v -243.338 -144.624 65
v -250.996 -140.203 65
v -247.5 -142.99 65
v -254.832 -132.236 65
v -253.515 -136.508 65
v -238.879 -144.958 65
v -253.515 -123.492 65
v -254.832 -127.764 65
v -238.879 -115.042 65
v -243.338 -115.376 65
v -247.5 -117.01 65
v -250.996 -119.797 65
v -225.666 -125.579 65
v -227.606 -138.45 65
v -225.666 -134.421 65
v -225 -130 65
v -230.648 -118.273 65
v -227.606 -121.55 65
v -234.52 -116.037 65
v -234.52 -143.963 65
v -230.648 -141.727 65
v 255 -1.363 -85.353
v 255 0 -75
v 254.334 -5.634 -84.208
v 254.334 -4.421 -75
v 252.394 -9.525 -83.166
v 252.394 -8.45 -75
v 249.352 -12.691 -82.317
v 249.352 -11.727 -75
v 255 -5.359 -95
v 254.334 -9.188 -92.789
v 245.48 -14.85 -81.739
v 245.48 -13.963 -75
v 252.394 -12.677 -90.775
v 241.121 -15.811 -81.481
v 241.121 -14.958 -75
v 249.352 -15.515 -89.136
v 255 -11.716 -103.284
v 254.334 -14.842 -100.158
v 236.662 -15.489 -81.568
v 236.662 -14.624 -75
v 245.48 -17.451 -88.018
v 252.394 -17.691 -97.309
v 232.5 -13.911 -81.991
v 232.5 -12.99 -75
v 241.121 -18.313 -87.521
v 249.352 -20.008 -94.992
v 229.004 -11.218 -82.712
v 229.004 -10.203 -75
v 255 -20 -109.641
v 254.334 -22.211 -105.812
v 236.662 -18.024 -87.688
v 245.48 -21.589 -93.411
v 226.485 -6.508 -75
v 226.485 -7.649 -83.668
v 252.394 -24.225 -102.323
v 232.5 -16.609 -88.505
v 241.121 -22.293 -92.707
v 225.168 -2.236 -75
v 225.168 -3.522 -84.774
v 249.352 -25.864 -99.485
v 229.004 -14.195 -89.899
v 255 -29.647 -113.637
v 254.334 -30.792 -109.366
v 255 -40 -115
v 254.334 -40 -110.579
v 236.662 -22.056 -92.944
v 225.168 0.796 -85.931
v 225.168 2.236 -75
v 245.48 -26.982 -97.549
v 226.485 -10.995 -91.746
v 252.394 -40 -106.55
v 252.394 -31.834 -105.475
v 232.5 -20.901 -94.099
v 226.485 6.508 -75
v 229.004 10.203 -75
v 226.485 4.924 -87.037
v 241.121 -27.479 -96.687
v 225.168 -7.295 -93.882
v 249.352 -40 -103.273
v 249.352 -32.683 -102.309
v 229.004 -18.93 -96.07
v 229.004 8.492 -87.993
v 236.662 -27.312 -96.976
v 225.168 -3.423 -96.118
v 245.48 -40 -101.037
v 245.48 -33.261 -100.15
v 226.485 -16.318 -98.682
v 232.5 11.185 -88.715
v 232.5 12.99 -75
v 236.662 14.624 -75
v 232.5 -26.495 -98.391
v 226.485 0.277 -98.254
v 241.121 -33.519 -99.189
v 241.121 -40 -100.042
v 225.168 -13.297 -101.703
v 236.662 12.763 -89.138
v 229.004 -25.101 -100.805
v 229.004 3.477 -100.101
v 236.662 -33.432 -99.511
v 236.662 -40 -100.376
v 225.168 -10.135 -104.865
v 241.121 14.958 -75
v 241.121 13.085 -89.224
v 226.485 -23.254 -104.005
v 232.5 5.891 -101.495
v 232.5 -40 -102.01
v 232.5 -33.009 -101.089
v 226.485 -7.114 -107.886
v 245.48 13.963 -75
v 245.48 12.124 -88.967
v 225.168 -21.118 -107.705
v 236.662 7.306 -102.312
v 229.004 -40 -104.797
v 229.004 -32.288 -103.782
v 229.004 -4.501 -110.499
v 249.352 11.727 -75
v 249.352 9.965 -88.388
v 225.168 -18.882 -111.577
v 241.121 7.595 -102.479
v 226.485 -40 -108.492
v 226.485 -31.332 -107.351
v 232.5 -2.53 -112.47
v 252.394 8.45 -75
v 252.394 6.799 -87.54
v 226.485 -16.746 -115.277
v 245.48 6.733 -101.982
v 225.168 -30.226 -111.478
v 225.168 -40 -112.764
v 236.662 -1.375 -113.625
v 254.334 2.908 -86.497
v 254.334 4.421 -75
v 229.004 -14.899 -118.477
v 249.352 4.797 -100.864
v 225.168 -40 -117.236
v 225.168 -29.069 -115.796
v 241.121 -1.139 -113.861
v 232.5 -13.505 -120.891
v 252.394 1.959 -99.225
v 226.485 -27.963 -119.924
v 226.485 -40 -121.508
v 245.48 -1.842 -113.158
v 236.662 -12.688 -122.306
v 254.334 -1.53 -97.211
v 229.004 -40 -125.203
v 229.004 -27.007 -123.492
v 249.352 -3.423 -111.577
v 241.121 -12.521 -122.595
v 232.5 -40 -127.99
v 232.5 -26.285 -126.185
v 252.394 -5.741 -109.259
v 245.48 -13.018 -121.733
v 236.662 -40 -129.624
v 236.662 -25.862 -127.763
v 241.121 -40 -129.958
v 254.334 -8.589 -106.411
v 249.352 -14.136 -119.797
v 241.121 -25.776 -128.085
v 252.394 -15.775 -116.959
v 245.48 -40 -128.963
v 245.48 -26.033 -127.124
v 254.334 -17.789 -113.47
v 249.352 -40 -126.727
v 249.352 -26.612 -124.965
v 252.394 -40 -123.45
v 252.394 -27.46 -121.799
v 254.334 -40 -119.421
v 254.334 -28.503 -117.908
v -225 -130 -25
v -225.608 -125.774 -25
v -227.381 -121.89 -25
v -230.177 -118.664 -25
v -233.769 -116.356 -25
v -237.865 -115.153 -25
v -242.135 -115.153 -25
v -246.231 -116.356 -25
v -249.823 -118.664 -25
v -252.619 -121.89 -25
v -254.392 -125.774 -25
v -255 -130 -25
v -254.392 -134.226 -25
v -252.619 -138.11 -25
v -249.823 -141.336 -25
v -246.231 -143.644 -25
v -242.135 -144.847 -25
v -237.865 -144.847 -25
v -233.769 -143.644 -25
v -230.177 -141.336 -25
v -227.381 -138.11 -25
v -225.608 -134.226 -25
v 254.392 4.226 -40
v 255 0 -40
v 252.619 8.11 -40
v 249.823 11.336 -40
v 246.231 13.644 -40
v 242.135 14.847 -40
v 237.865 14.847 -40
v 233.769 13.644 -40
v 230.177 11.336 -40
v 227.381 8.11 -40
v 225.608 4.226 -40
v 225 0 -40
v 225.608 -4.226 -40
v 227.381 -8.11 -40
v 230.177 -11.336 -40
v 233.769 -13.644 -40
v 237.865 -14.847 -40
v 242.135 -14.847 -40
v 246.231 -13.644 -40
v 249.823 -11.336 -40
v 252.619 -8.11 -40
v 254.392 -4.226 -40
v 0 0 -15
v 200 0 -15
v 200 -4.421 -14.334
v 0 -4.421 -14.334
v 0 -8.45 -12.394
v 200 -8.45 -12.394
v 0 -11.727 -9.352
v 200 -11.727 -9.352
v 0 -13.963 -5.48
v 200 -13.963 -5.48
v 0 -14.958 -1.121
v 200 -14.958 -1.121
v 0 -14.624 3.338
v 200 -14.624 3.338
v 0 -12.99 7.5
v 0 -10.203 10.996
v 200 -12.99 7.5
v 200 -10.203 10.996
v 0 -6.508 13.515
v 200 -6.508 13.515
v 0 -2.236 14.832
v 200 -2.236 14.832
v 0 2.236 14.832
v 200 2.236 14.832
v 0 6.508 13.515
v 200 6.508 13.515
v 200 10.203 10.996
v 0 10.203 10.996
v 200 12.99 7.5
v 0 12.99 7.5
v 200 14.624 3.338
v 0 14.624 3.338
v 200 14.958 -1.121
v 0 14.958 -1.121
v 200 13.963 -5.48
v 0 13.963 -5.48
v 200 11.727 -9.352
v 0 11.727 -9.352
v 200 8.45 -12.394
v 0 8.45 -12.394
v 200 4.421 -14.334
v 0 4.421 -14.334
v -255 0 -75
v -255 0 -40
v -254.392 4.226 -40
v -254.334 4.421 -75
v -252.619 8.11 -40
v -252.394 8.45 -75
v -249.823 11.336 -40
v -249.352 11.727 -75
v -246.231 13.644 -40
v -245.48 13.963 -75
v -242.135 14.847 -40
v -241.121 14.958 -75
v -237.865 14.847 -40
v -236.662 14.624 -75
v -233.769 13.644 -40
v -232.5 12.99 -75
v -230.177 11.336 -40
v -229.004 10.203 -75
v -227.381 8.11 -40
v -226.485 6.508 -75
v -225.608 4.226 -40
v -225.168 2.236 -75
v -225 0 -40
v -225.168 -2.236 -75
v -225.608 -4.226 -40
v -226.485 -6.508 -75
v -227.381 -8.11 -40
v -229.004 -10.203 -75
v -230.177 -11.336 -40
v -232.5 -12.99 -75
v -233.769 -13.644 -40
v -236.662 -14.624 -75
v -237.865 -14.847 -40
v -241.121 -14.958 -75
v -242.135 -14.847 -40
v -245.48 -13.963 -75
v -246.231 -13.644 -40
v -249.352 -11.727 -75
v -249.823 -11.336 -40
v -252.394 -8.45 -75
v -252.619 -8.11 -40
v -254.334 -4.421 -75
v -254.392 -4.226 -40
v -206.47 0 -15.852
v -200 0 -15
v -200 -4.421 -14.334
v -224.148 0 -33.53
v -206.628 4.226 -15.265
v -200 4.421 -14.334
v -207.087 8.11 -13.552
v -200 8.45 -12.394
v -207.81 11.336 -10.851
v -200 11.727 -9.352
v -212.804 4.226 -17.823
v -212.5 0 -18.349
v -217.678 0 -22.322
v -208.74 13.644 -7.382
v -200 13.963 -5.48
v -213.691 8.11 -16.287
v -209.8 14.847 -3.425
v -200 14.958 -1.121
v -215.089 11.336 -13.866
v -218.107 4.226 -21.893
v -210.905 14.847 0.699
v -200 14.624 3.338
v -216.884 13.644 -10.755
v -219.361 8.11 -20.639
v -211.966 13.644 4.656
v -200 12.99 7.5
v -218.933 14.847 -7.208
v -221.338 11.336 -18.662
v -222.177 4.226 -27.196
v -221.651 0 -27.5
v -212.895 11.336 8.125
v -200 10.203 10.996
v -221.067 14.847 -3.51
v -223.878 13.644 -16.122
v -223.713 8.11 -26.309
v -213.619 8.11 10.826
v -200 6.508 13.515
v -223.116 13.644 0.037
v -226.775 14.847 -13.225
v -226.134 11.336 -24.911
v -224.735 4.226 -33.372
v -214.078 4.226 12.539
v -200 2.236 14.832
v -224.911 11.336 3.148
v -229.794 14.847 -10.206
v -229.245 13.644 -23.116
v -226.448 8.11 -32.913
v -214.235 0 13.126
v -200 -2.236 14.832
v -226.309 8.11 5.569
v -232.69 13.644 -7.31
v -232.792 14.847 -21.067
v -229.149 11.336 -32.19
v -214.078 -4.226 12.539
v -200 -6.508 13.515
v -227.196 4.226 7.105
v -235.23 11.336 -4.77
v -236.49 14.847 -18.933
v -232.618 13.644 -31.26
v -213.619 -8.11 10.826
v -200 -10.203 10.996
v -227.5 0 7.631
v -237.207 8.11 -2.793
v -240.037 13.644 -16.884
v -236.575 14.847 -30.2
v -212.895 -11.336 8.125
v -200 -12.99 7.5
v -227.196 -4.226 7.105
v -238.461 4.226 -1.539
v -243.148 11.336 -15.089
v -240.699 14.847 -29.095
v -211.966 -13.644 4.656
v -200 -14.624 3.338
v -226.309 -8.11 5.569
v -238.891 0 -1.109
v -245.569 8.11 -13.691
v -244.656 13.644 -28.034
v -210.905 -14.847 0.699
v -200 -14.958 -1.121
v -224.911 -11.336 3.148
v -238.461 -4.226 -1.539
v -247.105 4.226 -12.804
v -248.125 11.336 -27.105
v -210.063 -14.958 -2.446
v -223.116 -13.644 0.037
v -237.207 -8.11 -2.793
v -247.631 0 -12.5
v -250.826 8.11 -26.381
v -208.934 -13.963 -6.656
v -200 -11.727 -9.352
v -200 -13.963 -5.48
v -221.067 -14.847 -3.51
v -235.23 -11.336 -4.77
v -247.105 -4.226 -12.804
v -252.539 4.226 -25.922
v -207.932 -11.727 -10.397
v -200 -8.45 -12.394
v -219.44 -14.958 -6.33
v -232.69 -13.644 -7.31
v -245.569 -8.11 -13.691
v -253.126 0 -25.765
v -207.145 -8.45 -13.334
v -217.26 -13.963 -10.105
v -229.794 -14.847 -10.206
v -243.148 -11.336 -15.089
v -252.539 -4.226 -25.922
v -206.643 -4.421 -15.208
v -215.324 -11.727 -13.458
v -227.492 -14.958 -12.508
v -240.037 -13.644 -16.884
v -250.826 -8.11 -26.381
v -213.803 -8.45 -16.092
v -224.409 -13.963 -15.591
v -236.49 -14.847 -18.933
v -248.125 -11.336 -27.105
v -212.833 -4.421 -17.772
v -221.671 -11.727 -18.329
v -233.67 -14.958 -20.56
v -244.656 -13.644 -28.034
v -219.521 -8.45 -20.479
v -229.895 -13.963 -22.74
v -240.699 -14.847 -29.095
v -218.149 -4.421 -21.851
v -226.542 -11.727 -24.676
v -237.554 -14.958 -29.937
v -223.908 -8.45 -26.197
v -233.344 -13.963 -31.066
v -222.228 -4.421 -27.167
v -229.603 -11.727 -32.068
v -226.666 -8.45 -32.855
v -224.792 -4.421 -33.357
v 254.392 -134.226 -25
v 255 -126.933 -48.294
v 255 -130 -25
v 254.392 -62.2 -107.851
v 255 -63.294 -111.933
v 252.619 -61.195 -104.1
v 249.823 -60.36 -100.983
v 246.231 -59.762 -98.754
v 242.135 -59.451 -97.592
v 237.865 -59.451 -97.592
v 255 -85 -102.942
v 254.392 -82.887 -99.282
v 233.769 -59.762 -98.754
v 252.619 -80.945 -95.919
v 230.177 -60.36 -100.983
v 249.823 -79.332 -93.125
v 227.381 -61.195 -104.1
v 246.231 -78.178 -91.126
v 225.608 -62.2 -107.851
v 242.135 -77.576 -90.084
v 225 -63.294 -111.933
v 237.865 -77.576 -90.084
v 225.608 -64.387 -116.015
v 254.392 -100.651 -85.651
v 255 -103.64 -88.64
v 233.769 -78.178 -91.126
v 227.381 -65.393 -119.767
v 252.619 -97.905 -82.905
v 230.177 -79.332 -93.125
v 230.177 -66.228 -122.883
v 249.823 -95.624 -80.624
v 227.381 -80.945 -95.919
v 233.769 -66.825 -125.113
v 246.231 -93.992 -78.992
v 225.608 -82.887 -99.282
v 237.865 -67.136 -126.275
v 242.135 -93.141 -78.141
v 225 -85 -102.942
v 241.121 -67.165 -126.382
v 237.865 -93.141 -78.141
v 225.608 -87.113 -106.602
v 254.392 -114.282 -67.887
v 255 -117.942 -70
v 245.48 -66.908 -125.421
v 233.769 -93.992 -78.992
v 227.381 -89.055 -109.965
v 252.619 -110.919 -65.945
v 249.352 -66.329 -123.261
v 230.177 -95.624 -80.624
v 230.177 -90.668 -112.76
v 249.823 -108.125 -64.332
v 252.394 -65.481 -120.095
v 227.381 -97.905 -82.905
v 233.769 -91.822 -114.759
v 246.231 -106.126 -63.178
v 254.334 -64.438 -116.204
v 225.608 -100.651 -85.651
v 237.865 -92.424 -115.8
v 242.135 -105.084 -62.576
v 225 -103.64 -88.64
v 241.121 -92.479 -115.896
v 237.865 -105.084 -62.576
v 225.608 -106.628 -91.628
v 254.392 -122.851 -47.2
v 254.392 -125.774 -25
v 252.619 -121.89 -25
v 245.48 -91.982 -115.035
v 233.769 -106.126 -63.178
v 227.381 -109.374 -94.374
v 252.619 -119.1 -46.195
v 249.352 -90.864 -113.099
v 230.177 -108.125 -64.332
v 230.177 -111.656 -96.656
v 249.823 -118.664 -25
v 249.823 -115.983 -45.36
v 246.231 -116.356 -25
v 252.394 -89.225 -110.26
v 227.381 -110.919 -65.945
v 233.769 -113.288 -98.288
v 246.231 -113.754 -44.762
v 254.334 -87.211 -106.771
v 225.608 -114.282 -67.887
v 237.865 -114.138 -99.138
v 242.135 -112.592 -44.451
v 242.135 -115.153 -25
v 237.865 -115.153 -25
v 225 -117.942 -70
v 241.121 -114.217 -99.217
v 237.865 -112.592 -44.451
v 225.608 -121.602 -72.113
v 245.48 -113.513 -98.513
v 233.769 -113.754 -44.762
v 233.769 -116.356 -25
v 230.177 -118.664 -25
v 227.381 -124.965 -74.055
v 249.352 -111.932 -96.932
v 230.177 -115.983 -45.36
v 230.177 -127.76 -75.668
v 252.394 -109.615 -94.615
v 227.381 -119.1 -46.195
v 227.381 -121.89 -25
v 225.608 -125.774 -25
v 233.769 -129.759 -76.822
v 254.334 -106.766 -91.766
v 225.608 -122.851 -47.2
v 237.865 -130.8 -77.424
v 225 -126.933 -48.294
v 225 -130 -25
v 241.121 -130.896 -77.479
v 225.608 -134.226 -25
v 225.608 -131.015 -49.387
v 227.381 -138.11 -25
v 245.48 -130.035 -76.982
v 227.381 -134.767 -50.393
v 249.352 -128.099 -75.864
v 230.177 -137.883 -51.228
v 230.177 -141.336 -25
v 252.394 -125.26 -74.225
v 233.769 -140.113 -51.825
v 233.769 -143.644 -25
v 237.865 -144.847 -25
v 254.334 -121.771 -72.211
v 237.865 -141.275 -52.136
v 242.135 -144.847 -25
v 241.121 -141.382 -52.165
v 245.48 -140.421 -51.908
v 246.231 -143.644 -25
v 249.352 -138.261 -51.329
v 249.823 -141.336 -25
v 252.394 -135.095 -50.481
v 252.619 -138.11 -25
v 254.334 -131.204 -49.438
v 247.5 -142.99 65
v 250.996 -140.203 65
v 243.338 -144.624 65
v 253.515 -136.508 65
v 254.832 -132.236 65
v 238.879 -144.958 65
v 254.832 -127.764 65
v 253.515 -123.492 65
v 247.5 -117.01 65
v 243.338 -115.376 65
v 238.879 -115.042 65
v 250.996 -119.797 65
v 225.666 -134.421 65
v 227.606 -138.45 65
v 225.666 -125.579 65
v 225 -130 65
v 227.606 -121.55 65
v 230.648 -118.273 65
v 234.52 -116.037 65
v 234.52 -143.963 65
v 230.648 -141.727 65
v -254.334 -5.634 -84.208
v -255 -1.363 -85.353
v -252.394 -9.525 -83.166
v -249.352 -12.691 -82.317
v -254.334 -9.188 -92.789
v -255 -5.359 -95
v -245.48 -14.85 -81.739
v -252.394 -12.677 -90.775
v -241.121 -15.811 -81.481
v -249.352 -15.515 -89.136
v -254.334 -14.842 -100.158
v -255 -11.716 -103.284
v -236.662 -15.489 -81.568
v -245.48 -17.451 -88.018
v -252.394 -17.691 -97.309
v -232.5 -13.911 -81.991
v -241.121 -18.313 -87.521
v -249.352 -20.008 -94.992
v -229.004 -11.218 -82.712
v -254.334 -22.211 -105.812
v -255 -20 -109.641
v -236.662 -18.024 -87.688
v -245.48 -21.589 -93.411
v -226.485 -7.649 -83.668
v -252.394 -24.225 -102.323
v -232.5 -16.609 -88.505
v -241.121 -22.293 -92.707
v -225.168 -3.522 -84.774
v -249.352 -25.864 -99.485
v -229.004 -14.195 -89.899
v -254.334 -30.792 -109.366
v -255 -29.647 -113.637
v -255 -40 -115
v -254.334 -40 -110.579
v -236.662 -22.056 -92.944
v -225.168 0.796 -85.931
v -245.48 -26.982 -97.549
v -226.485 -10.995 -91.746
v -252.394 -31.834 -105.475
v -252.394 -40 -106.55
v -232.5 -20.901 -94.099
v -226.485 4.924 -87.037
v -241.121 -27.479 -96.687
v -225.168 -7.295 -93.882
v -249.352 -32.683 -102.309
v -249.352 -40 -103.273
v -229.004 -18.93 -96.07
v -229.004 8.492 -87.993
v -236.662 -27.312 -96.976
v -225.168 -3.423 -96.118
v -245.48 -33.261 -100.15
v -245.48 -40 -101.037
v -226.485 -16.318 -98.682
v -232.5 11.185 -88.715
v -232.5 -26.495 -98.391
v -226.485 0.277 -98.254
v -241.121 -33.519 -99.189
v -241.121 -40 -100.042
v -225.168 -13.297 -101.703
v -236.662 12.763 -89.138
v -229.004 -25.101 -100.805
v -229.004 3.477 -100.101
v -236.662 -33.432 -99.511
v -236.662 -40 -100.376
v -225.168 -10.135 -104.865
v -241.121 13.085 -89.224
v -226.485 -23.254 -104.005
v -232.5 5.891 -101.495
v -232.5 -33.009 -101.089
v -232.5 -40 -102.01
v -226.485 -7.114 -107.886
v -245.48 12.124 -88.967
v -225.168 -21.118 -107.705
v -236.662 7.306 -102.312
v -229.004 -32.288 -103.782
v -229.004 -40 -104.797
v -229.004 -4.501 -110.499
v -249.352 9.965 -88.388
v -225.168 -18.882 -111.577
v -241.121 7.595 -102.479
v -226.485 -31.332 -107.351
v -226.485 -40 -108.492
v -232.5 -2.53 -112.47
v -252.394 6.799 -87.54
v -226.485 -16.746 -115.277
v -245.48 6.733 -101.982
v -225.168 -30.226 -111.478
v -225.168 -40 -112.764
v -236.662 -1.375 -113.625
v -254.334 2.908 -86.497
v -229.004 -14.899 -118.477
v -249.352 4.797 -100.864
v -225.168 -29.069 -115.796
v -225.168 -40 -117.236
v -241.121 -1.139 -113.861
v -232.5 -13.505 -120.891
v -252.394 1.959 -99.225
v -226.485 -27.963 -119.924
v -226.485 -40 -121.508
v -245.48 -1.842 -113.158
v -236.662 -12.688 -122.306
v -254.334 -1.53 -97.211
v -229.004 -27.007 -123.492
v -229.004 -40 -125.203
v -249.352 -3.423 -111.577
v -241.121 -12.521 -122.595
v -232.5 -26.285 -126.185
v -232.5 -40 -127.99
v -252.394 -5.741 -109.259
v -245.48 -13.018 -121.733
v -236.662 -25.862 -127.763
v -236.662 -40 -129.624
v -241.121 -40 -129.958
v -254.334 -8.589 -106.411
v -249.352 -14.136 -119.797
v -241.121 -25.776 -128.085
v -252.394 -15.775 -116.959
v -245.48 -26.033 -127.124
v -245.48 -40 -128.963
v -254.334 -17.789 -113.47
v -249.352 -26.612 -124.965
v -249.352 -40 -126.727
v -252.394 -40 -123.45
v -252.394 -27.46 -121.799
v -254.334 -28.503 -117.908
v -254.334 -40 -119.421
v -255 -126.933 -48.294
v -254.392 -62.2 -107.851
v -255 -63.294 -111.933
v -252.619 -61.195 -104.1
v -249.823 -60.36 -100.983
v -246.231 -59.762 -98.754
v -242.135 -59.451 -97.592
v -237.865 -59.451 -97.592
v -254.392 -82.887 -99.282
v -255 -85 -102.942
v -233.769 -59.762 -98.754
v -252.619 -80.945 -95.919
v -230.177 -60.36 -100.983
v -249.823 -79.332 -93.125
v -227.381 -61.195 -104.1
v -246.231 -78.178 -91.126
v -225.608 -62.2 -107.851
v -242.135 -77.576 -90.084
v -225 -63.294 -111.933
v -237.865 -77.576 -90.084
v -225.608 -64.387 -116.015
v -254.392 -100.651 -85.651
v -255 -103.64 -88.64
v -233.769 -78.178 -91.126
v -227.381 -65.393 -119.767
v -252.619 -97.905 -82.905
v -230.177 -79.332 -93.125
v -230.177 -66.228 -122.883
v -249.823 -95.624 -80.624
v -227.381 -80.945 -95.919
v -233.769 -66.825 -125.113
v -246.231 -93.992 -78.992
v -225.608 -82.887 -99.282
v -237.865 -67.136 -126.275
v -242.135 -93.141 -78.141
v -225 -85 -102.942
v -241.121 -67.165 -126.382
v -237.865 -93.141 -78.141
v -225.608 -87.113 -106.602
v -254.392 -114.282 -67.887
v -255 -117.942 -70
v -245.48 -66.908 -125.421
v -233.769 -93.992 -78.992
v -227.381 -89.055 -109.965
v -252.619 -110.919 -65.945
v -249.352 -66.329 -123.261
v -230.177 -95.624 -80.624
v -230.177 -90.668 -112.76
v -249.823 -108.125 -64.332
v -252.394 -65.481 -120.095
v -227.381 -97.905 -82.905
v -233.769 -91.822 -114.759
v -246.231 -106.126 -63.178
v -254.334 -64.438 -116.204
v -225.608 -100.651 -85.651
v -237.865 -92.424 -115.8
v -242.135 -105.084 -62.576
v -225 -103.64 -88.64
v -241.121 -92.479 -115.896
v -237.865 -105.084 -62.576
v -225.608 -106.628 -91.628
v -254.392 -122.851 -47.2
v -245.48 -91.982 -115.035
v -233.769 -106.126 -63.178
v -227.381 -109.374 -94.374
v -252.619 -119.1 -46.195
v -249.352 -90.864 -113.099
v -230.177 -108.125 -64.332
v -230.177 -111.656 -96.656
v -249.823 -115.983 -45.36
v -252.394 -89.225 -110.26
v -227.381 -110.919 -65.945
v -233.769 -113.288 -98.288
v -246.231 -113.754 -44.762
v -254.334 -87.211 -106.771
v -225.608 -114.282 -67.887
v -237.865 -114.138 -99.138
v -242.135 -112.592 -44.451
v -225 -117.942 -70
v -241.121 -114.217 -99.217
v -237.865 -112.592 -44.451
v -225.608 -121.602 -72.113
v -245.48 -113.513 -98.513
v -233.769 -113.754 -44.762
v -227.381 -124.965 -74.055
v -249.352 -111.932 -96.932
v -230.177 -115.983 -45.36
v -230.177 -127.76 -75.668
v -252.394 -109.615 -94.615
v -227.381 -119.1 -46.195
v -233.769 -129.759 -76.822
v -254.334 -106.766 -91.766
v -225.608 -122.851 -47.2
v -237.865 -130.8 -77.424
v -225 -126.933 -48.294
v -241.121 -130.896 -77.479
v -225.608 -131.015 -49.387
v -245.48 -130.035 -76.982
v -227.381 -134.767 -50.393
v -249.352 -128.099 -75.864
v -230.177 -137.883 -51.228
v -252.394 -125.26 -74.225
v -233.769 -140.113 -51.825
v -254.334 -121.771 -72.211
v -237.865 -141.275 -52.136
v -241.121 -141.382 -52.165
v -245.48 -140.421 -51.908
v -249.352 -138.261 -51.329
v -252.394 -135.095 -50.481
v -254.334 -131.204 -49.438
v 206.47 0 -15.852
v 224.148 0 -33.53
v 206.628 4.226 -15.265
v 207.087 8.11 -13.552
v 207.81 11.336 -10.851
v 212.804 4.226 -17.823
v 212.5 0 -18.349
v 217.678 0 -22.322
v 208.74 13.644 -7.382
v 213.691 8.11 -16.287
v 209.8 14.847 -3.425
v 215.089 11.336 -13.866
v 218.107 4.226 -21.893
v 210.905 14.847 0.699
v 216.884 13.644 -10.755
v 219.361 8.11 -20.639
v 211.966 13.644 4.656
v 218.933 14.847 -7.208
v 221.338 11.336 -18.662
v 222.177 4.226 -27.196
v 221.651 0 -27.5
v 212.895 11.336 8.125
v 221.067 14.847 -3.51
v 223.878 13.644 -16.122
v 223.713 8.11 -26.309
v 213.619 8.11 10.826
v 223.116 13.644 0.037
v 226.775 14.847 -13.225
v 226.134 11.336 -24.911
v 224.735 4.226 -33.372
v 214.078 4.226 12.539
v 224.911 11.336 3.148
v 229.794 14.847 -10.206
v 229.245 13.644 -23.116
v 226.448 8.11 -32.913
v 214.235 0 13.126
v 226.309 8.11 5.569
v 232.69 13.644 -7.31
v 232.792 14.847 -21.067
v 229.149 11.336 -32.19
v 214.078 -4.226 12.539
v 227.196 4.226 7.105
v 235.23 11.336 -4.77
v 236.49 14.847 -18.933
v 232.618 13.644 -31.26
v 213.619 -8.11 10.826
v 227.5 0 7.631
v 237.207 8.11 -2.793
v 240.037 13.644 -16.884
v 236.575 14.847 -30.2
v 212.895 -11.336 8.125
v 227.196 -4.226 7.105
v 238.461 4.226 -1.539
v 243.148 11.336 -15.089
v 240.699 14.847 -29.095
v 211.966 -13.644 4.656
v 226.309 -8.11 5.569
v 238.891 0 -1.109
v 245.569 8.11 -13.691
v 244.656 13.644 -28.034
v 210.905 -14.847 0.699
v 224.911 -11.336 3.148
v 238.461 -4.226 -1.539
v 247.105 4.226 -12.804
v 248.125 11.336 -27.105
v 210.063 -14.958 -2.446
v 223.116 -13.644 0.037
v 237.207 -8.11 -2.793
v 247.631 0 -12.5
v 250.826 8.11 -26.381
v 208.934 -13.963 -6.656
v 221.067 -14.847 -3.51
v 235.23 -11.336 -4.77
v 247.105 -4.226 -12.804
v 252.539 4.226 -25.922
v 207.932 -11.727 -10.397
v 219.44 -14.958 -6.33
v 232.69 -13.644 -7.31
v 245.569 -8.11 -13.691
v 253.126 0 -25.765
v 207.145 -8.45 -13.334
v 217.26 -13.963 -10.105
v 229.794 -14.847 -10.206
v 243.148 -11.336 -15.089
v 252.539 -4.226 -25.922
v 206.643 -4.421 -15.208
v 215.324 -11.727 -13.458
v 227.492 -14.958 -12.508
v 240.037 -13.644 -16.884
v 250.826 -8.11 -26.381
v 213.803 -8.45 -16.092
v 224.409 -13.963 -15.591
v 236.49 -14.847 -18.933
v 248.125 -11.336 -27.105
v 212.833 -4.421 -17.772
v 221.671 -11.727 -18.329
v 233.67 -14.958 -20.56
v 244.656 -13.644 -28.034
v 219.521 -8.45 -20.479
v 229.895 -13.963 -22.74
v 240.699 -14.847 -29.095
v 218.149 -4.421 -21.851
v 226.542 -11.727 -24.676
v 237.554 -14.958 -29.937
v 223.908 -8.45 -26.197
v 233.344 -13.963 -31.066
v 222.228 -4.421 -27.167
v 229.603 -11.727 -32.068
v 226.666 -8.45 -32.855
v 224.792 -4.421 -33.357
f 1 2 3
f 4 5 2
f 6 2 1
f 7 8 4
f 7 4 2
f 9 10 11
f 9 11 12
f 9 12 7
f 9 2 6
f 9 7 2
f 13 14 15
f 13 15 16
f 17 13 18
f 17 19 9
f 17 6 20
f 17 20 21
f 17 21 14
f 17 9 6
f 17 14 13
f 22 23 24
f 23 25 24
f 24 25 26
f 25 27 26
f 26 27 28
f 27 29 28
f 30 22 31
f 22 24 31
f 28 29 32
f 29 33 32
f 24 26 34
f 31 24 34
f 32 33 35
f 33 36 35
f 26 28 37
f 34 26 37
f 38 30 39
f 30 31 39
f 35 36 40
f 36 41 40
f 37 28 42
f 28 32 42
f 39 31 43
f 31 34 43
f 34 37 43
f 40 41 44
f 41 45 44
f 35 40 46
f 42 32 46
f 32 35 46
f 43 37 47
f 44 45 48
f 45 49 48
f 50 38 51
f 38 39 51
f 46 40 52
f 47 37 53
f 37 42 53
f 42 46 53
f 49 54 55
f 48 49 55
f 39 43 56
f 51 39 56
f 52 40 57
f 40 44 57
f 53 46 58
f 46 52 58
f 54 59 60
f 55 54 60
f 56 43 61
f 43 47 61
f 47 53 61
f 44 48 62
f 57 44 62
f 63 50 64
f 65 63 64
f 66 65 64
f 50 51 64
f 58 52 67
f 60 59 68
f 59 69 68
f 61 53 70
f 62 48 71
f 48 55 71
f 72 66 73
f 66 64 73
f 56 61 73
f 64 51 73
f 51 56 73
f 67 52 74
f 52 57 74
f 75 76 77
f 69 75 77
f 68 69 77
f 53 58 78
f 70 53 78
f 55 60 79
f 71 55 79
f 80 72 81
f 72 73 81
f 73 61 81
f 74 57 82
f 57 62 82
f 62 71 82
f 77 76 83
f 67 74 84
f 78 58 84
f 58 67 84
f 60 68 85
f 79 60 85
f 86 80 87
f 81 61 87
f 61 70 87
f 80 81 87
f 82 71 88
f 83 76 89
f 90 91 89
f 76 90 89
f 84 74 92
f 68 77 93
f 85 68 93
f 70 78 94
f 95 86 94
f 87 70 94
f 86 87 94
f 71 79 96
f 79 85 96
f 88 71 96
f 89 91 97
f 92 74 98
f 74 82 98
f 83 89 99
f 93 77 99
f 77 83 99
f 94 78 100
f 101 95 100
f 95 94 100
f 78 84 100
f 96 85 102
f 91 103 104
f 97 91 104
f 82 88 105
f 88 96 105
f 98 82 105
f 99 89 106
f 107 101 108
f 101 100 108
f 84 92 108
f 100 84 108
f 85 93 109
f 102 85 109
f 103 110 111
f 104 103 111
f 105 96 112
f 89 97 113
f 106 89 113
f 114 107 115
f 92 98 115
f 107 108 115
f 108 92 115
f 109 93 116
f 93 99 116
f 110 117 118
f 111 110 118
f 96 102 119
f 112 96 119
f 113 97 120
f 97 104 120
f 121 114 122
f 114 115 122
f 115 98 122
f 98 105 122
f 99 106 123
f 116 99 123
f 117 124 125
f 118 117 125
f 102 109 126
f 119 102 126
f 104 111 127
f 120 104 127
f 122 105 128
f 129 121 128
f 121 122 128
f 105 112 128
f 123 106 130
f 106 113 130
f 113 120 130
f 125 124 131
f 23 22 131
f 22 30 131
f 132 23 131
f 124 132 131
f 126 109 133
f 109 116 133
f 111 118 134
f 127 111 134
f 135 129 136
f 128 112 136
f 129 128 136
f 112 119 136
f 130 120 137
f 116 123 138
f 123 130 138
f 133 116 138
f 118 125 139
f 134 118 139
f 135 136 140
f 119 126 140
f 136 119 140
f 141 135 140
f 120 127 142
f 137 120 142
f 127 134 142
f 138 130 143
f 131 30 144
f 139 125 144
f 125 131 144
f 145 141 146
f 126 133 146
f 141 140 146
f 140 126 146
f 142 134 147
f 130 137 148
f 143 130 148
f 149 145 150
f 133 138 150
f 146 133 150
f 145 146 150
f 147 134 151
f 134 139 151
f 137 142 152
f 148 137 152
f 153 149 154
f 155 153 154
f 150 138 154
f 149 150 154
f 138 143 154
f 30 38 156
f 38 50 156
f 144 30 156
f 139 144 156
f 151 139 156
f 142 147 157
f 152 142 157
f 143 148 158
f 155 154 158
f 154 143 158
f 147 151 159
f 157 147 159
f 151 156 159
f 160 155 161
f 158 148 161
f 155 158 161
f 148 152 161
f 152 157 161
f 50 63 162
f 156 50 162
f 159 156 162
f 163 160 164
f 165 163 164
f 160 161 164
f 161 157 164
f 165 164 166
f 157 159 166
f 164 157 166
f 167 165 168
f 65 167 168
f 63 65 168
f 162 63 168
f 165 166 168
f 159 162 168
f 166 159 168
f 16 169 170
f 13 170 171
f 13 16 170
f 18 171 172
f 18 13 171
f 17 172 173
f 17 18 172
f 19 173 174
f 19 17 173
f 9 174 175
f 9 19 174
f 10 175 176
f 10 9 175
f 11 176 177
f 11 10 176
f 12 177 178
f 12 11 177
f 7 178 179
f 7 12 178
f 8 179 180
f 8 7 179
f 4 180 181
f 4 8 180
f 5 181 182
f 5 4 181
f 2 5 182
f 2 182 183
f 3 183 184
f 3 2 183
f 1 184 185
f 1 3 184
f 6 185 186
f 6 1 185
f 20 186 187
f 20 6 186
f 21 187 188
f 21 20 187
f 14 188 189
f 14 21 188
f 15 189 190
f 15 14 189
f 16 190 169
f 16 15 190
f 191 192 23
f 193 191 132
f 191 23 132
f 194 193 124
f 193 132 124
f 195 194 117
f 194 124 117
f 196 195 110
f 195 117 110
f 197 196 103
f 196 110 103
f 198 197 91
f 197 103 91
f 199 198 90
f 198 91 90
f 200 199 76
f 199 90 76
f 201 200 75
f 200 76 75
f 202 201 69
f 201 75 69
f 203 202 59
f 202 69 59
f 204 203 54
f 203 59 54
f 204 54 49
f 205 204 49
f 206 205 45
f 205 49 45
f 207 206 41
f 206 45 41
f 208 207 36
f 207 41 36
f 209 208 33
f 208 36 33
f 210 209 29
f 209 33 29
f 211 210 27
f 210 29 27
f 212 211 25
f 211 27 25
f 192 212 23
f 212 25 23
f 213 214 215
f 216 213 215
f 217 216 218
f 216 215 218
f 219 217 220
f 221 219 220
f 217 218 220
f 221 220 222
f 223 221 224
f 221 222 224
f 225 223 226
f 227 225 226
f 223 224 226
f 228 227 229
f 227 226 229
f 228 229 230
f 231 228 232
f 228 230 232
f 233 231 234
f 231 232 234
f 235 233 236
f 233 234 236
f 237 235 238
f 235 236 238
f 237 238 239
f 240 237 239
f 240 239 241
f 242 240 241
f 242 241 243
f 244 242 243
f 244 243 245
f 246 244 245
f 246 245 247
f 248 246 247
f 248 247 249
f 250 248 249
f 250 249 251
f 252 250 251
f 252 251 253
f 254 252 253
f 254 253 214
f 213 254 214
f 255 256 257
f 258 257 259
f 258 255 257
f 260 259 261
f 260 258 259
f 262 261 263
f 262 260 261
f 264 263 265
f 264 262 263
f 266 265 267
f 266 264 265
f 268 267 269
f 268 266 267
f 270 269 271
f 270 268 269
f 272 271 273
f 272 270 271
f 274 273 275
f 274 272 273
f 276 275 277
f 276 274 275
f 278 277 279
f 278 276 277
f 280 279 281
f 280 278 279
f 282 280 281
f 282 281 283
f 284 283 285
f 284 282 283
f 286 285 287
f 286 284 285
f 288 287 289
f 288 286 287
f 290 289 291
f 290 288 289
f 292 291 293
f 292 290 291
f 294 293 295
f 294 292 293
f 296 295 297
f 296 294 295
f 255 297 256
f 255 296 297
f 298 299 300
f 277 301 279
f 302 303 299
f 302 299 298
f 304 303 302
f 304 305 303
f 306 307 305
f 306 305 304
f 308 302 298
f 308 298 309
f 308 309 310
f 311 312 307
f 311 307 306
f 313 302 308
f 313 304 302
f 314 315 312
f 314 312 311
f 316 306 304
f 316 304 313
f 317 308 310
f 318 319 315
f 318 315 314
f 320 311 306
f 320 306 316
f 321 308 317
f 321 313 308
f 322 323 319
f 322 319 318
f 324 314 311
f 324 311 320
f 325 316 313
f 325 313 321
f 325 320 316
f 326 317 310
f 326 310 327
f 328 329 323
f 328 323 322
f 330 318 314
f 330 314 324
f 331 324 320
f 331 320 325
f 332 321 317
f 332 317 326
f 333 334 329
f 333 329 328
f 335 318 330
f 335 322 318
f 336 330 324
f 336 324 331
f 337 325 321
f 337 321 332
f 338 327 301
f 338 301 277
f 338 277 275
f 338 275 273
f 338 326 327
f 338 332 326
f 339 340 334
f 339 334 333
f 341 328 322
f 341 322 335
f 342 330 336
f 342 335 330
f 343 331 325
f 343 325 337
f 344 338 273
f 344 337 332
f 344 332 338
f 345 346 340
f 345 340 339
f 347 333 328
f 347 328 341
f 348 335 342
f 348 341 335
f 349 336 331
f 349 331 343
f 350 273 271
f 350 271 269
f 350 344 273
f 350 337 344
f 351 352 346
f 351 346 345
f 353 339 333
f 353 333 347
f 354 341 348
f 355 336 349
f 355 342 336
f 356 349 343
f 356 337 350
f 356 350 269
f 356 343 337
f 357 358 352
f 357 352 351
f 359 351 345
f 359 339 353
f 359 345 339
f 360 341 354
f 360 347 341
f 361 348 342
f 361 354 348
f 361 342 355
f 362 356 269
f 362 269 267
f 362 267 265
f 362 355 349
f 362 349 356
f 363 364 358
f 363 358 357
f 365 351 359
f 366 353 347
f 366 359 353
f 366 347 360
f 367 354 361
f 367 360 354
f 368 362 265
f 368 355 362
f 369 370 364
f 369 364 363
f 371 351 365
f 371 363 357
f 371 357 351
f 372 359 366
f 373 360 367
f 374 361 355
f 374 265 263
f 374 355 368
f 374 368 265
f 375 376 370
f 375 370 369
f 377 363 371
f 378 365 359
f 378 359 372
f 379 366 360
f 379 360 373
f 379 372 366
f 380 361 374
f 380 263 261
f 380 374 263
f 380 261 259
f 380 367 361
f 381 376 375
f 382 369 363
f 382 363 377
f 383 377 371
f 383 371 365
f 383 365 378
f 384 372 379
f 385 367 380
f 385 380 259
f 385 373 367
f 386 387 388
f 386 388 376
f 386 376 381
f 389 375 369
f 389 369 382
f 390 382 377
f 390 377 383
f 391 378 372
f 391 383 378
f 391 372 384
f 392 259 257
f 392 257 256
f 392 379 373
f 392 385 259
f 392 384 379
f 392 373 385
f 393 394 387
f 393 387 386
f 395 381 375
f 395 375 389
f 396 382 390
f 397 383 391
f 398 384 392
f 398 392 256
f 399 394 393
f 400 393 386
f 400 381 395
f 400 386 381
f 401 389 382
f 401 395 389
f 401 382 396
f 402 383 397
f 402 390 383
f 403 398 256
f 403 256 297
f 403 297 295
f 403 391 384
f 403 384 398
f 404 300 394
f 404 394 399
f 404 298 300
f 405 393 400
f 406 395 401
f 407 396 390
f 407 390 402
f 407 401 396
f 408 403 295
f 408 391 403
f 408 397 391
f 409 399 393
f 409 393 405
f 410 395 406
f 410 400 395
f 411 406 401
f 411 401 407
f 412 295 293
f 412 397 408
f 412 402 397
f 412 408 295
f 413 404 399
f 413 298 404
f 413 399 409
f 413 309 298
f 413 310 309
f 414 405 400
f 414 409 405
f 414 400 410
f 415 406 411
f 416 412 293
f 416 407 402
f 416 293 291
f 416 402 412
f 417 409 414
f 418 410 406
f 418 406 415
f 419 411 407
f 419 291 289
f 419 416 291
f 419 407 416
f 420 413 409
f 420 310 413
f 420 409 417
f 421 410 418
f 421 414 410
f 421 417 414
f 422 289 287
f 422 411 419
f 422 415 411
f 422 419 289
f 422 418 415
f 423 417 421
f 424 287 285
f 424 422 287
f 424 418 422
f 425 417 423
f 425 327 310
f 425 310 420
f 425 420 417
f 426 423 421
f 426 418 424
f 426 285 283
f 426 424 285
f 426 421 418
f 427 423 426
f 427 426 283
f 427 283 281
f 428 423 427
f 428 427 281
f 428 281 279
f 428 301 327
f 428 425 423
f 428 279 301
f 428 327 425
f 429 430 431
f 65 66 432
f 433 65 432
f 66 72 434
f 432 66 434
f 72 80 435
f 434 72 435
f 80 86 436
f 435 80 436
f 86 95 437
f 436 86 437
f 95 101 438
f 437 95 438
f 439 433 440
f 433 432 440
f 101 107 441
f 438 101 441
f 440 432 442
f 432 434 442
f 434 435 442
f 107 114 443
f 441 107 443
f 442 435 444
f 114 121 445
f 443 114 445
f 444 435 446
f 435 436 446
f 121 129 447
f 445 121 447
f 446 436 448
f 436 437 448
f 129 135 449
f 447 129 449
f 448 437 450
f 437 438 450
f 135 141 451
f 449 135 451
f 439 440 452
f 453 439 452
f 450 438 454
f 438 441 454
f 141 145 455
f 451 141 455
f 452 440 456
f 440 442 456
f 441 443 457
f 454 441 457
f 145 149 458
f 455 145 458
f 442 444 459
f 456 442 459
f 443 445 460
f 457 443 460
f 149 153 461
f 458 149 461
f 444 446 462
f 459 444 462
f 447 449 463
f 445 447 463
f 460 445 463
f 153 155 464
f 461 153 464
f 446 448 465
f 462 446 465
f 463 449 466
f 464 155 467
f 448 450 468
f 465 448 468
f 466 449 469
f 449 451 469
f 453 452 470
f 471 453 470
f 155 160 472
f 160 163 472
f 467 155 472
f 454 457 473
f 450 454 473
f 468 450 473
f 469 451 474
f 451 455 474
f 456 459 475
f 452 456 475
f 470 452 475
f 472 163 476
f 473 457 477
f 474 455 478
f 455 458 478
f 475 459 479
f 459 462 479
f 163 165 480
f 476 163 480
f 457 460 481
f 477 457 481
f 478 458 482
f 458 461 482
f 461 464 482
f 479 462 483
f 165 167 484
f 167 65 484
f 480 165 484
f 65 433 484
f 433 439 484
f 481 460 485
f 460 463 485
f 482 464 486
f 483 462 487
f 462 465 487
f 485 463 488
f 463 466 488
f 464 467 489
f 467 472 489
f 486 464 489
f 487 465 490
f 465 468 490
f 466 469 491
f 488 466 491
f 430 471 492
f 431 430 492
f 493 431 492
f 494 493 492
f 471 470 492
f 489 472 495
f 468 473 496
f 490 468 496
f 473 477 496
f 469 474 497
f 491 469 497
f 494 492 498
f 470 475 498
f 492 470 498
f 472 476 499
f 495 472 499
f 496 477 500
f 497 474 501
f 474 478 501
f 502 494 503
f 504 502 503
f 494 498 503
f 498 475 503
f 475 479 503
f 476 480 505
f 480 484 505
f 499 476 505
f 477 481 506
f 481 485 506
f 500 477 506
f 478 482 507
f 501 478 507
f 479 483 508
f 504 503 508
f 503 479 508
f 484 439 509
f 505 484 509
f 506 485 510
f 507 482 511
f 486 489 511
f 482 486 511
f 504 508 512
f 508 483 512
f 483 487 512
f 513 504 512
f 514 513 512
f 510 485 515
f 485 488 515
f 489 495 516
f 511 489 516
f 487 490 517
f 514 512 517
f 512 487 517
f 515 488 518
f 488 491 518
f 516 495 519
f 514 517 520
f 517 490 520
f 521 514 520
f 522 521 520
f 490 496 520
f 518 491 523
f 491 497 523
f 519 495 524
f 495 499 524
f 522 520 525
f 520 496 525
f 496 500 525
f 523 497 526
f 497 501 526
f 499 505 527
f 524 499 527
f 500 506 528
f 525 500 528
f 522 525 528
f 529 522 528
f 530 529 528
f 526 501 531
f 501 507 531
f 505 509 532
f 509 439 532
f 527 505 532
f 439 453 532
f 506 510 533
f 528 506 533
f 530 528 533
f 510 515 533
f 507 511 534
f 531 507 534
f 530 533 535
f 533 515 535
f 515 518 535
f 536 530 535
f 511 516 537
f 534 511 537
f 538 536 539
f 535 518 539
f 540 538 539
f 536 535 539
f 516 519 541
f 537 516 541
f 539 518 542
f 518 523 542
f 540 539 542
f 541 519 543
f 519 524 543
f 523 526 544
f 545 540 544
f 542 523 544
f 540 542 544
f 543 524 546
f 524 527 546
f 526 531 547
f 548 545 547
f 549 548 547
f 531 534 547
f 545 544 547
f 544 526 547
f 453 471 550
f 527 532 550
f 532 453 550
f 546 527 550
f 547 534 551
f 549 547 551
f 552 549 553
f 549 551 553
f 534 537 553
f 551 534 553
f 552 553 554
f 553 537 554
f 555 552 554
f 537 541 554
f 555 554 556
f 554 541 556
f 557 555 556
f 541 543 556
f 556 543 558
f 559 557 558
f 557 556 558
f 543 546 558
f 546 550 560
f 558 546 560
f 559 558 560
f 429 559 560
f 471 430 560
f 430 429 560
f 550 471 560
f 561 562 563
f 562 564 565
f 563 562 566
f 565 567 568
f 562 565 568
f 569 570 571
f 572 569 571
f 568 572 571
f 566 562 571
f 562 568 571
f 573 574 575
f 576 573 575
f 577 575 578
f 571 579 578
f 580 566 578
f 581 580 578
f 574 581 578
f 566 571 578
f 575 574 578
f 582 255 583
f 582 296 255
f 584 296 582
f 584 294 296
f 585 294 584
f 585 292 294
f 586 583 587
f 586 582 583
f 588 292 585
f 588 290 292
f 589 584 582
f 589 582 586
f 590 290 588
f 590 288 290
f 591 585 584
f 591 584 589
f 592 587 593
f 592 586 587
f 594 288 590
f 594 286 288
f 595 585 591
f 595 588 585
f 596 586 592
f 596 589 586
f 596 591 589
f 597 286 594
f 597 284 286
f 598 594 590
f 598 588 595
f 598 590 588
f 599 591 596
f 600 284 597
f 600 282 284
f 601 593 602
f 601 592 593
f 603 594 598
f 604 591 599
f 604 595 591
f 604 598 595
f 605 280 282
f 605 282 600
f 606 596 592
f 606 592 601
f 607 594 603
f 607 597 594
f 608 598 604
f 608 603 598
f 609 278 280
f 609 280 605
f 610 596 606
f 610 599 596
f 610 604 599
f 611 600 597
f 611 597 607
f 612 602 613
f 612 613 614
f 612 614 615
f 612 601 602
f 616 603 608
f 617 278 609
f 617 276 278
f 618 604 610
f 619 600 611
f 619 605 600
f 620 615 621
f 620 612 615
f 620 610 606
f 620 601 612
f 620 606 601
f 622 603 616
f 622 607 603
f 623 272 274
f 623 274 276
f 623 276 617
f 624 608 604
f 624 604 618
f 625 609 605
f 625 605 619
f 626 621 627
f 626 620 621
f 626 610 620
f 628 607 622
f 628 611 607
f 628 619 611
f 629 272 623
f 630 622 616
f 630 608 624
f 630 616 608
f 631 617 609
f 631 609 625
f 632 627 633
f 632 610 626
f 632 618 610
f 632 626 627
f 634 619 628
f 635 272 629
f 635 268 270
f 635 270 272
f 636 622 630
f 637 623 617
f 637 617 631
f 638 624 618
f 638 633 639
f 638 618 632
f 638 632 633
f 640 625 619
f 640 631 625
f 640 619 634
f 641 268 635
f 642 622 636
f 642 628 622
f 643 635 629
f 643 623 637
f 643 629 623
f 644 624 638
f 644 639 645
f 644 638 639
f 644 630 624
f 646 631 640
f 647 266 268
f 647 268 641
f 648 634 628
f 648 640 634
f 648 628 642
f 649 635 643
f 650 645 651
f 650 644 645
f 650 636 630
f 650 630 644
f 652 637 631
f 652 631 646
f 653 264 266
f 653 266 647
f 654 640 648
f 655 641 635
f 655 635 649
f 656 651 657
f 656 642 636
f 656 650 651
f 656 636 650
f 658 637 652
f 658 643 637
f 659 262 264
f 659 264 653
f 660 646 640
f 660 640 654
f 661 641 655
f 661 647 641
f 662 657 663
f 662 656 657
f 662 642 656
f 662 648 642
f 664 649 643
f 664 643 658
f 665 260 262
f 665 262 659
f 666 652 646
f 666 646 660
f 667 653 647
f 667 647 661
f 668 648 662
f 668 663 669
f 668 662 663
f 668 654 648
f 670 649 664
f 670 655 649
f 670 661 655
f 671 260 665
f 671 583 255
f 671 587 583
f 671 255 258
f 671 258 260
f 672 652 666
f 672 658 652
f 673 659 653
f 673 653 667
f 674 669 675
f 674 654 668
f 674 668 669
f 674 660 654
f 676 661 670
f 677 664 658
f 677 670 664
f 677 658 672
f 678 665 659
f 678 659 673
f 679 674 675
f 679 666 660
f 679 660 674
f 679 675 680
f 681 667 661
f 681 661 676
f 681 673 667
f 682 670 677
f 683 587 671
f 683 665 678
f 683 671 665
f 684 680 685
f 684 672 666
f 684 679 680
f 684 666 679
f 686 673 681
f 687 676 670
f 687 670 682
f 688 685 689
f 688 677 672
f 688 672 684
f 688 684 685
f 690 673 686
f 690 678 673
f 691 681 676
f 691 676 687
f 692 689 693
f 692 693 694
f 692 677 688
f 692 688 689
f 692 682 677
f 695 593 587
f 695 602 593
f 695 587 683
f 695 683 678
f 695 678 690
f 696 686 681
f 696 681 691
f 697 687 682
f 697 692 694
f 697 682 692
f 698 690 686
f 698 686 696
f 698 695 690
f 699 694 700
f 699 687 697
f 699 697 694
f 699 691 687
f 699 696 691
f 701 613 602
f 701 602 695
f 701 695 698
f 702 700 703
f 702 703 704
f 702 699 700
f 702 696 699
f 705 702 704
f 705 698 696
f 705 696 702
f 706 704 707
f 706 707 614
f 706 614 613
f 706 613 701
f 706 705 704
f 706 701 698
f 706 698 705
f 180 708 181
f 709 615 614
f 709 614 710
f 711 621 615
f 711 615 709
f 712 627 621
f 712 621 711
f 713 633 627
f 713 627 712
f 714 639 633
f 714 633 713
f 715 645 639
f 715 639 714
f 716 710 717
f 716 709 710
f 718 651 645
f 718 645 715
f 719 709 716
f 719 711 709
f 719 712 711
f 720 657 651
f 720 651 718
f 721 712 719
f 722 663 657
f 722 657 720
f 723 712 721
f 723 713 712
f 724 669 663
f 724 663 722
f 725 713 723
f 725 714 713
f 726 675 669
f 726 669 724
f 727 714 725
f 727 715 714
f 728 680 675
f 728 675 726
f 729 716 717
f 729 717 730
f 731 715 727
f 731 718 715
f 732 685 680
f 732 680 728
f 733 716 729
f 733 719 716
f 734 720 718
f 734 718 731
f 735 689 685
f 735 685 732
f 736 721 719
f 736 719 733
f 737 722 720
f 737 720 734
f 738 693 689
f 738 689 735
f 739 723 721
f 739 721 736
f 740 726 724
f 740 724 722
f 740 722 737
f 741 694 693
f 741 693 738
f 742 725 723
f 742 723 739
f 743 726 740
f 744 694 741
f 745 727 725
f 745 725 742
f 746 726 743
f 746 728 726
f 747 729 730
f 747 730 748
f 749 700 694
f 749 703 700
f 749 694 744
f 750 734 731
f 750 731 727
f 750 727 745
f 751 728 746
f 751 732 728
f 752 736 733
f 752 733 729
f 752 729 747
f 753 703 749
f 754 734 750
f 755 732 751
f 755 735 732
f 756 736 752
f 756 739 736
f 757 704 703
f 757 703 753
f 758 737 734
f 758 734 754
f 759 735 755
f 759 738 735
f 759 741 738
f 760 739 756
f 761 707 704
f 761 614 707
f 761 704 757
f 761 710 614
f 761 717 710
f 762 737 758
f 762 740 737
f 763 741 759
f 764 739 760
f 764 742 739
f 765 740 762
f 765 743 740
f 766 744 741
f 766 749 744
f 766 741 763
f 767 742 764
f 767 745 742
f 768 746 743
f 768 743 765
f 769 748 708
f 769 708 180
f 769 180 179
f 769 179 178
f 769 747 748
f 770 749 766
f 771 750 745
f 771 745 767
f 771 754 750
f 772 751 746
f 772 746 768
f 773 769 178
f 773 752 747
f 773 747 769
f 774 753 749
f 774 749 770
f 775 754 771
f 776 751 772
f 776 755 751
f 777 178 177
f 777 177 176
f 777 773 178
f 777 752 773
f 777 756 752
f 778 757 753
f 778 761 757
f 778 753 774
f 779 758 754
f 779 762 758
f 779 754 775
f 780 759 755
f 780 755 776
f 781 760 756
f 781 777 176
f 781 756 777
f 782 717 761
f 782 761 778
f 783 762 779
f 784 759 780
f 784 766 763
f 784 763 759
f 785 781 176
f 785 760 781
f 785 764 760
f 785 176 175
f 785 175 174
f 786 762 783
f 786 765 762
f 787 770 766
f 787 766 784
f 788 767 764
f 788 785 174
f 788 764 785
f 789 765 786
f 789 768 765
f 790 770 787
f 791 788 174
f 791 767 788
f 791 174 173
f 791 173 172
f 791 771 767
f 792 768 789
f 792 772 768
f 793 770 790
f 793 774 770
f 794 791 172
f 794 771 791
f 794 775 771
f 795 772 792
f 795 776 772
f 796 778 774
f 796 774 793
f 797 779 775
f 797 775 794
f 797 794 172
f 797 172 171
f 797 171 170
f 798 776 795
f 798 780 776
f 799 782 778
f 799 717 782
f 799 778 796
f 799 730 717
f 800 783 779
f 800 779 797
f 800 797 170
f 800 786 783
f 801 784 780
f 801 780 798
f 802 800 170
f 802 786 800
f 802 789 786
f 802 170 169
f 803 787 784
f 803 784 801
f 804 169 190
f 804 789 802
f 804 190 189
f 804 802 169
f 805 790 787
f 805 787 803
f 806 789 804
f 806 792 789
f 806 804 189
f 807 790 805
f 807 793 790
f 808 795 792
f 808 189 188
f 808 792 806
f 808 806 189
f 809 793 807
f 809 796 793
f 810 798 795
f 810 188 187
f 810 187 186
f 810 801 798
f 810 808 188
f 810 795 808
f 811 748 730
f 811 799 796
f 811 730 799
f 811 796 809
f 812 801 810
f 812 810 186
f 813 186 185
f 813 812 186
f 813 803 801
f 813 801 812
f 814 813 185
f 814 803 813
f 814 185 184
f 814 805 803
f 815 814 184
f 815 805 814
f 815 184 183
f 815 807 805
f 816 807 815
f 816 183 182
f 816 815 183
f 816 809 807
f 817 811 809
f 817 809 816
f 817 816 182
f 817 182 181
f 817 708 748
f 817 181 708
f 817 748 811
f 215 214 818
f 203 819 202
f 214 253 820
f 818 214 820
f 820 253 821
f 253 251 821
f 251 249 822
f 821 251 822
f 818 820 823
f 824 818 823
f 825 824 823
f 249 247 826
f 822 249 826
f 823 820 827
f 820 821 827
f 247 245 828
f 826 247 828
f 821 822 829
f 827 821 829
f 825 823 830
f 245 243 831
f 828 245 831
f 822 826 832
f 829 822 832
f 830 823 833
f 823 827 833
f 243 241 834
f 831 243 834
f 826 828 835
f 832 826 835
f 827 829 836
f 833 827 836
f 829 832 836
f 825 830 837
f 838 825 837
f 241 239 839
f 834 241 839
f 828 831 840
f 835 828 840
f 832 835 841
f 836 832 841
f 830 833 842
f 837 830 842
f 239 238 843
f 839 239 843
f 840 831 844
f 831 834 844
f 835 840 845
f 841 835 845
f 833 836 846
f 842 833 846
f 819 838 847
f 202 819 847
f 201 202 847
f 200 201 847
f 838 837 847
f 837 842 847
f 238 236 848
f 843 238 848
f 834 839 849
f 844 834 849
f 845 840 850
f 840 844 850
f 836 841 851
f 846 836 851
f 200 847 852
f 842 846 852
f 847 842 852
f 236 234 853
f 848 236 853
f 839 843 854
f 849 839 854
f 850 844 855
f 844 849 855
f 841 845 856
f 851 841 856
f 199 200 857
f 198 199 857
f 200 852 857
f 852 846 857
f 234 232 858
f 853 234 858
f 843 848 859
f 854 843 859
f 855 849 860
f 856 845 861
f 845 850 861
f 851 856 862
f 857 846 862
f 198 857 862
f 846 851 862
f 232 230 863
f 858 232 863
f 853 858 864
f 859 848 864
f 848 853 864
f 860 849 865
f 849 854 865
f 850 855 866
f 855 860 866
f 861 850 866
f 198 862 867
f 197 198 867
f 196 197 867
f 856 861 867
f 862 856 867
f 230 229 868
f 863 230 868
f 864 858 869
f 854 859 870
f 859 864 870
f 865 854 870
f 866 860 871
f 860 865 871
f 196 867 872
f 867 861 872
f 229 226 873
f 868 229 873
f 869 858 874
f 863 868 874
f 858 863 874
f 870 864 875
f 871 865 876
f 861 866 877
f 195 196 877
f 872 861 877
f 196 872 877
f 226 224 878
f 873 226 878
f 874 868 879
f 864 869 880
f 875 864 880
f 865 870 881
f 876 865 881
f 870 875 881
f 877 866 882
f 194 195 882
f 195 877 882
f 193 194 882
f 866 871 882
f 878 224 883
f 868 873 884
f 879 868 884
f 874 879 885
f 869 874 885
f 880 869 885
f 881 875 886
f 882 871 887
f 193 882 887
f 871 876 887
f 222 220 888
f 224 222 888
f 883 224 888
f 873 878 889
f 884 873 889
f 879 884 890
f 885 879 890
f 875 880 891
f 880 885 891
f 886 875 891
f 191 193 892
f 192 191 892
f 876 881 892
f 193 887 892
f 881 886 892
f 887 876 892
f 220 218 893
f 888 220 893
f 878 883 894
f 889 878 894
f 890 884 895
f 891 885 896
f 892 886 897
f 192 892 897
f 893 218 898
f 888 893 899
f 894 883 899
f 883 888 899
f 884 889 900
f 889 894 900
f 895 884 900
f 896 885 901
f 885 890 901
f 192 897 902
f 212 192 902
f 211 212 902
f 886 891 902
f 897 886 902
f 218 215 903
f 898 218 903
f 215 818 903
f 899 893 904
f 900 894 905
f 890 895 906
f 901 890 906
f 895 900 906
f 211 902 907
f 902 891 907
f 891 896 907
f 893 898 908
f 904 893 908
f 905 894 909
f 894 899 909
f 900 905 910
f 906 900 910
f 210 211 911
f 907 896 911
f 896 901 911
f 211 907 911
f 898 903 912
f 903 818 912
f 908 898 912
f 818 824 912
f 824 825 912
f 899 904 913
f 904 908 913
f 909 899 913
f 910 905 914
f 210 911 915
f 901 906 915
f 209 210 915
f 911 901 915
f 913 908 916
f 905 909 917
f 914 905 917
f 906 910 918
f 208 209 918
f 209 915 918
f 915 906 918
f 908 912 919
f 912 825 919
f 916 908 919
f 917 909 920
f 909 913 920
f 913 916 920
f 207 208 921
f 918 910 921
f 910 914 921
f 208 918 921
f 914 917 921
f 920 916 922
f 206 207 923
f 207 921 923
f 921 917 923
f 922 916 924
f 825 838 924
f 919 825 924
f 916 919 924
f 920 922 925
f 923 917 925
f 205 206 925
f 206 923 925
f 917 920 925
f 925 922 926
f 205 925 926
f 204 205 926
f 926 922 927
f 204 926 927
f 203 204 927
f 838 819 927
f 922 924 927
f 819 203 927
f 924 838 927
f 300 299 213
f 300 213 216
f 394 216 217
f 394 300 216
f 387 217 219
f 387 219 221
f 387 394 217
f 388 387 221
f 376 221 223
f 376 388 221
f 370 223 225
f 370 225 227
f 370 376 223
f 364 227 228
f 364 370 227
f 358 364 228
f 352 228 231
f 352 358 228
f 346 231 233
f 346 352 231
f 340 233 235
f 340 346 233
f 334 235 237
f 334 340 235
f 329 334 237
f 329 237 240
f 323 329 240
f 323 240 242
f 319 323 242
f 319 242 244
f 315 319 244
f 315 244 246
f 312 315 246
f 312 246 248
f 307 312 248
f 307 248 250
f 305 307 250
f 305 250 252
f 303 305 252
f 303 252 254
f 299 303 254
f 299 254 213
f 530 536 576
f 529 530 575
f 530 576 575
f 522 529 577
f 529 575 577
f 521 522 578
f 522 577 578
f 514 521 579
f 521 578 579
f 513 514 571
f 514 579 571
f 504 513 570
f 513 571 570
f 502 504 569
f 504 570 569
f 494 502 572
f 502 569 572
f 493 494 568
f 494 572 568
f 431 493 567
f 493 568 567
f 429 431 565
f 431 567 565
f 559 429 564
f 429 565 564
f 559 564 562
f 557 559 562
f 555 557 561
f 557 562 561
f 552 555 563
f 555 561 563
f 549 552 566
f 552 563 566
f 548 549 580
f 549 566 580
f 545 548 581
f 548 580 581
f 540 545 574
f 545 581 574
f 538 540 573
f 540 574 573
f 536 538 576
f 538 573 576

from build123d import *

# Parameters (mm, degrees)
SWEEP4_PROFILE_R = 15
SWEEP5_PROFILE_R = 15
SWEEP6_PROFILE_R = 15


with BuildPart() as part:
    # Sweep4: sweep along a path in Sketch1
    with BuildLine(Plane(origin=(0, 0, 0), x_dir=(1, 0, 0), z_dir=(0, 1, 0))) as sweep4_path:
        Line((0, 0), (-200, 0))
        ThreePointArc((-200, 0), (-228.284271247, 11.715728753), (-240, 40))
    # Sweep4 profile (on start of the path) → Sweep4 (sweep)
    with BuildSketch(Plane(origin=(0, 0, 0), x_dir=(0, 0, -1), z_dir=(-1, 0, 0))):
        Circle(SWEEP4_PROFILE_R)
    sweep4 = sweep(path=sweep4_path.line)

    # Sweep5: sweep along a path in Sketch2
    with BuildLine(Plane(origin=(-240, 0, 0), x_dir=(0, 0, -1), z_dir=(1, 0, 0))) as sweep5_path:
        Line((40, 0), (75, 0))
        ThreePointArc((75, 0), (103.284271247, -11.715728753), (115, -40))
        ThreePointArc((115, -40), (88.639610307, -103.639610307), (25, -130))
    # Sweep5 profile (on start of the path) → Sweep5 (sweep)
    with BuildSketch(Plane(origin=(-240, 0, -40), x_dir=(-1, 0, 0), z_dir=(0, 0, -1))):
        Circle(SWEEP5_PROFILE_R)
    sweep5 = sweep(path=sweep5_path.line)

    # Sweep6: sweep along a path in Sketch3
    with BuildLine(Plane(origin=(-240, 0, 0), x_dir=(0, 0, -1), z_dir=(1, 0, 0))) as sweep6_path:
        Line((25, -130), (-65, -130))
    # Sweep6 profile (on start of the path) → Sweep6 (sweep)
    with BuildSketch(Plane(origin=(-240, -130, -25), x_dir=(1, 0, 0), z_dir=(0, 0, 1))):
        Circle(SWEEP6_PROFILE_R)
    sweep6 = sweep(path=sweep6_path.line)

    # Mirror1: Sweep4, Sweep5, Sweep6 across plane
    add(sweep4.mirror(Plane(origin=(0, 0, 0), x_dir=(0, 0, 1), z_dir=(1, 0, 0))))
    add(sweep5.mirror(Plane(origin=(0, 0, 0), x_dir=(0, 0, 1), z_dir=(1, 0, 0))))
    add(sweep6.mirror(Plane(origin=(0, 0, 0), x_dir=(0, 0, 1), z_dir=(1, 0, 0))))


solid = part.part
